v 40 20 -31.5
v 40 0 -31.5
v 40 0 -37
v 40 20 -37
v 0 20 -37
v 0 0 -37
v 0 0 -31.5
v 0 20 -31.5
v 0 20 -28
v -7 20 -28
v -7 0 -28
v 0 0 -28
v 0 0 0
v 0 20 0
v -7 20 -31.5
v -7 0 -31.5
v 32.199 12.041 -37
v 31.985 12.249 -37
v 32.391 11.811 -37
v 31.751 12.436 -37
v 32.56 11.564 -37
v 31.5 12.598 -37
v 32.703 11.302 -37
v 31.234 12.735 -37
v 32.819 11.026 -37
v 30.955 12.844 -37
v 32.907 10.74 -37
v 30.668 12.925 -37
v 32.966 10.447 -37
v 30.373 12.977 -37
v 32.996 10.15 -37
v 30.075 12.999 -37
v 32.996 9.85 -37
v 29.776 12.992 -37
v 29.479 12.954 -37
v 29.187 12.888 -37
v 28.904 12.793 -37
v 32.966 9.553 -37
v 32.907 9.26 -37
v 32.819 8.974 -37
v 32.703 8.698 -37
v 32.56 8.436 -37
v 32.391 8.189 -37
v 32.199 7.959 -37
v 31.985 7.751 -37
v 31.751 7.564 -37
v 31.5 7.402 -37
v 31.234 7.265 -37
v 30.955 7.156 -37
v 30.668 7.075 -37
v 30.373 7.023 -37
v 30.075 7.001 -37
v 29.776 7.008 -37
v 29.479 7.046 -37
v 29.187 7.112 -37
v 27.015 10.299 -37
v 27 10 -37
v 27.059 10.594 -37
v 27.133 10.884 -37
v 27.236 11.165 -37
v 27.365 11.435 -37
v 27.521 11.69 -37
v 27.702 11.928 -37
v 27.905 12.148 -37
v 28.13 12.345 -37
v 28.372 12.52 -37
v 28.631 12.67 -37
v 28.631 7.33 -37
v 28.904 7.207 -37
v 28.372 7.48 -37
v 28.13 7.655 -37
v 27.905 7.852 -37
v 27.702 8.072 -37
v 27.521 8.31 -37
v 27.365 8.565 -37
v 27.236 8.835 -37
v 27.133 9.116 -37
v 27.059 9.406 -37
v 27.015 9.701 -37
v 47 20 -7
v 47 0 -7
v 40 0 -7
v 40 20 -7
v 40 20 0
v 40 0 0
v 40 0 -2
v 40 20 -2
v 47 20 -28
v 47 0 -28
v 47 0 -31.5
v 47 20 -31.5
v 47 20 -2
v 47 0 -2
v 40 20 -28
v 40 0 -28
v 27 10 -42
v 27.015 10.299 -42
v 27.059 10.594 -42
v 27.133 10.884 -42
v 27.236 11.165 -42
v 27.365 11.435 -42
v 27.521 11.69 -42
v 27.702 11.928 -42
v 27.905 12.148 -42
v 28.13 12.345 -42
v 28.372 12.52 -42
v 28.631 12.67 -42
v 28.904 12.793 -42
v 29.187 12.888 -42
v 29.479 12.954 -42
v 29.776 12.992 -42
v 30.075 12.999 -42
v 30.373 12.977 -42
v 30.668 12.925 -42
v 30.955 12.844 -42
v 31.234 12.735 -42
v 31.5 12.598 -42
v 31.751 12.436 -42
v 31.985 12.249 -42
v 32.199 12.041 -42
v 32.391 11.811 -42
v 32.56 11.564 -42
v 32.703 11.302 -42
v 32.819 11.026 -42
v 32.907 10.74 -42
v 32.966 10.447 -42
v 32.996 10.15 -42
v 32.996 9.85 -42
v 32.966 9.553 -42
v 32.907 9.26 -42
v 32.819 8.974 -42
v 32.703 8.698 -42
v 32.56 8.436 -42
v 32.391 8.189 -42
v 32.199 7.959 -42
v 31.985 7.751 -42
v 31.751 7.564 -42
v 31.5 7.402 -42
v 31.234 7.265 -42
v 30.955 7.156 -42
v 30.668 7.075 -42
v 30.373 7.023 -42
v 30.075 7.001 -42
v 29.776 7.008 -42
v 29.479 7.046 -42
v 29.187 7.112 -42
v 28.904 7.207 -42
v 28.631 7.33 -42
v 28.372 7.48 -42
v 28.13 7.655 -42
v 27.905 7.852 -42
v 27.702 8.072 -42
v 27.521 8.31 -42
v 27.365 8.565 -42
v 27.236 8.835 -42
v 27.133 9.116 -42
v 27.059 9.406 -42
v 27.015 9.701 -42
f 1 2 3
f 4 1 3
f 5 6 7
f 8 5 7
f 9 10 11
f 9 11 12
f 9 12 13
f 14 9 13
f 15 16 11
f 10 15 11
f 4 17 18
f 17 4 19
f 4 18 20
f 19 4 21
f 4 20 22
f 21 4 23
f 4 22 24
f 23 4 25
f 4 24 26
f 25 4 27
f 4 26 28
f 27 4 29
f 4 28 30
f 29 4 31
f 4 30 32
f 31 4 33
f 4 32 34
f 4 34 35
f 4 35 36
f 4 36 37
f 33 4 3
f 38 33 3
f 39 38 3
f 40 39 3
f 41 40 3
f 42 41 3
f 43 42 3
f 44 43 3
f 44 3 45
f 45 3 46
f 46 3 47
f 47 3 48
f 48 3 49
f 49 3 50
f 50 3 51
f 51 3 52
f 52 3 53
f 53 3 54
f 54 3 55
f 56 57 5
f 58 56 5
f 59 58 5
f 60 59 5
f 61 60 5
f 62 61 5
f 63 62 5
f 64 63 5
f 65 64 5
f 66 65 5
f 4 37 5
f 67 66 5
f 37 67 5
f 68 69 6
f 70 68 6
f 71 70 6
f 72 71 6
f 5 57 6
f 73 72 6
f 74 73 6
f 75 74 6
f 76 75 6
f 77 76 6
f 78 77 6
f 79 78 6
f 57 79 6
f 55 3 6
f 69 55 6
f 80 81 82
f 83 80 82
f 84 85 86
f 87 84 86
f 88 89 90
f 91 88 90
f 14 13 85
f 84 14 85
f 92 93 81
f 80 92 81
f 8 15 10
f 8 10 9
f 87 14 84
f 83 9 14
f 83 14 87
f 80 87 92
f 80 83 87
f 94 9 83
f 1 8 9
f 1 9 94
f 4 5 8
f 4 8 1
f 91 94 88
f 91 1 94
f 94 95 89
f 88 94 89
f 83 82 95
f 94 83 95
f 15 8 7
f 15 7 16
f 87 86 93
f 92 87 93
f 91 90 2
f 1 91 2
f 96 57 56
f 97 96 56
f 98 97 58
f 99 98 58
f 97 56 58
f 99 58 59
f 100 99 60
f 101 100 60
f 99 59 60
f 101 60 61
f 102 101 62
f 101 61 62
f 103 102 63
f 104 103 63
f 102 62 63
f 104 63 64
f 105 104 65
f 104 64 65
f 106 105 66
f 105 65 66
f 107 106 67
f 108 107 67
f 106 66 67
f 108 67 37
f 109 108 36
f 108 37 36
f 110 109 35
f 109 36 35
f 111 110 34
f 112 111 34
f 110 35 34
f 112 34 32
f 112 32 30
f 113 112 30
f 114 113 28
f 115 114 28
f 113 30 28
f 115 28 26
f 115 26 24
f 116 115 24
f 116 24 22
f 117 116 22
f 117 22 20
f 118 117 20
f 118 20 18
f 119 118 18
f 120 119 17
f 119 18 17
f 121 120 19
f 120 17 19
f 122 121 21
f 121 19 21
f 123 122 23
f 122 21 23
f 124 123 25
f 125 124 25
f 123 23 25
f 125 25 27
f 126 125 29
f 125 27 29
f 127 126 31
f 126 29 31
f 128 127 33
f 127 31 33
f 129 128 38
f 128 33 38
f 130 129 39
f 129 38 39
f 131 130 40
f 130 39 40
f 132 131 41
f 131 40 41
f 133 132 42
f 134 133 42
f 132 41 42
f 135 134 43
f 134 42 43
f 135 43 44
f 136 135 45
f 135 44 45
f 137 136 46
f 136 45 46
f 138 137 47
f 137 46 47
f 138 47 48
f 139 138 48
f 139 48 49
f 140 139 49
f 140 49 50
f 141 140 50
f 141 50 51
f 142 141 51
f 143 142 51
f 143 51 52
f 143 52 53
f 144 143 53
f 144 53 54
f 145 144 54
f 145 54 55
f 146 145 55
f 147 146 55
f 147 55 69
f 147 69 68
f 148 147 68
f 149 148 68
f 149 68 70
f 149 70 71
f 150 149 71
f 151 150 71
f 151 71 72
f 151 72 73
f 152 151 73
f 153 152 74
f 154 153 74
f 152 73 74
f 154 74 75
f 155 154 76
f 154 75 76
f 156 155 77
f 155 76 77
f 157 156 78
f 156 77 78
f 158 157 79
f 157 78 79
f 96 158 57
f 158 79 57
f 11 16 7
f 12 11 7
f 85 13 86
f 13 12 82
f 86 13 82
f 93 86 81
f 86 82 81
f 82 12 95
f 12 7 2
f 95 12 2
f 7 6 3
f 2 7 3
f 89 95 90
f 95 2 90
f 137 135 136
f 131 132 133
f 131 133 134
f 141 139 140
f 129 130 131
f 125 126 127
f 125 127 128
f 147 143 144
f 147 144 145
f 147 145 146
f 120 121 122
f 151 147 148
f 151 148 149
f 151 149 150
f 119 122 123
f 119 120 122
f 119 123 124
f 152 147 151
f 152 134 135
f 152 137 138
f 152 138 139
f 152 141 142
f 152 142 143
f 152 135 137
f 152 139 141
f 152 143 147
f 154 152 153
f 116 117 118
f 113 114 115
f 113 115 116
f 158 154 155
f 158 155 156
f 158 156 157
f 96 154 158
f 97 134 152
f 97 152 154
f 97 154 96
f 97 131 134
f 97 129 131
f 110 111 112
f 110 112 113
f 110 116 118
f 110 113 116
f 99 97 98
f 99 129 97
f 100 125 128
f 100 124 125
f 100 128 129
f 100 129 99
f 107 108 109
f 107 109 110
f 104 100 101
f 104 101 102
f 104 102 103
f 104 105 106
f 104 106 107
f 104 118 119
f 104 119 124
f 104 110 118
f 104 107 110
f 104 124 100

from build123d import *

# Parameters (mm, degrees)
BOSS_EXTRU_1_DEPTH = 20
ESQUISSE2_R        = 3
BOSS_EXTRU_2_DEPTH = 5


with BuildPart() as part:
    # Esquisse1 → Boss.-Extru.1 (new body)
    with BuildSketch(Plane(origin=(0, 0, 0), x_dir=(1, 0, 0), z_dir=(0, 1, 0))):
        Polygon((0, 0), (40, 0), (40, 2), (47, 2), (47, 7), (40, 7), (40, 28), (47, 28), (47, 31.5), (40, 31.5), (40, 37), (0, 37), (0, 31.5), (-7, 31.5), (-7, 28), (0, 28), align=None)
    extrude(amount=BOSS_EXTRU_1_DEPTH)

    # Esquisse2 → Boss.-Extru.2 (add)
    with BuildSketch(Plane(origin=(0, 0, -37), x_dir=(-1, 0, 0), z_dir=(0, 0, -1))):
        with Locations((-30, 10)):
            Circle(ESQUISSE2_R)
    extrude(amount=BOSS_EXTRU_2_DEPTH)


solid = part.part
